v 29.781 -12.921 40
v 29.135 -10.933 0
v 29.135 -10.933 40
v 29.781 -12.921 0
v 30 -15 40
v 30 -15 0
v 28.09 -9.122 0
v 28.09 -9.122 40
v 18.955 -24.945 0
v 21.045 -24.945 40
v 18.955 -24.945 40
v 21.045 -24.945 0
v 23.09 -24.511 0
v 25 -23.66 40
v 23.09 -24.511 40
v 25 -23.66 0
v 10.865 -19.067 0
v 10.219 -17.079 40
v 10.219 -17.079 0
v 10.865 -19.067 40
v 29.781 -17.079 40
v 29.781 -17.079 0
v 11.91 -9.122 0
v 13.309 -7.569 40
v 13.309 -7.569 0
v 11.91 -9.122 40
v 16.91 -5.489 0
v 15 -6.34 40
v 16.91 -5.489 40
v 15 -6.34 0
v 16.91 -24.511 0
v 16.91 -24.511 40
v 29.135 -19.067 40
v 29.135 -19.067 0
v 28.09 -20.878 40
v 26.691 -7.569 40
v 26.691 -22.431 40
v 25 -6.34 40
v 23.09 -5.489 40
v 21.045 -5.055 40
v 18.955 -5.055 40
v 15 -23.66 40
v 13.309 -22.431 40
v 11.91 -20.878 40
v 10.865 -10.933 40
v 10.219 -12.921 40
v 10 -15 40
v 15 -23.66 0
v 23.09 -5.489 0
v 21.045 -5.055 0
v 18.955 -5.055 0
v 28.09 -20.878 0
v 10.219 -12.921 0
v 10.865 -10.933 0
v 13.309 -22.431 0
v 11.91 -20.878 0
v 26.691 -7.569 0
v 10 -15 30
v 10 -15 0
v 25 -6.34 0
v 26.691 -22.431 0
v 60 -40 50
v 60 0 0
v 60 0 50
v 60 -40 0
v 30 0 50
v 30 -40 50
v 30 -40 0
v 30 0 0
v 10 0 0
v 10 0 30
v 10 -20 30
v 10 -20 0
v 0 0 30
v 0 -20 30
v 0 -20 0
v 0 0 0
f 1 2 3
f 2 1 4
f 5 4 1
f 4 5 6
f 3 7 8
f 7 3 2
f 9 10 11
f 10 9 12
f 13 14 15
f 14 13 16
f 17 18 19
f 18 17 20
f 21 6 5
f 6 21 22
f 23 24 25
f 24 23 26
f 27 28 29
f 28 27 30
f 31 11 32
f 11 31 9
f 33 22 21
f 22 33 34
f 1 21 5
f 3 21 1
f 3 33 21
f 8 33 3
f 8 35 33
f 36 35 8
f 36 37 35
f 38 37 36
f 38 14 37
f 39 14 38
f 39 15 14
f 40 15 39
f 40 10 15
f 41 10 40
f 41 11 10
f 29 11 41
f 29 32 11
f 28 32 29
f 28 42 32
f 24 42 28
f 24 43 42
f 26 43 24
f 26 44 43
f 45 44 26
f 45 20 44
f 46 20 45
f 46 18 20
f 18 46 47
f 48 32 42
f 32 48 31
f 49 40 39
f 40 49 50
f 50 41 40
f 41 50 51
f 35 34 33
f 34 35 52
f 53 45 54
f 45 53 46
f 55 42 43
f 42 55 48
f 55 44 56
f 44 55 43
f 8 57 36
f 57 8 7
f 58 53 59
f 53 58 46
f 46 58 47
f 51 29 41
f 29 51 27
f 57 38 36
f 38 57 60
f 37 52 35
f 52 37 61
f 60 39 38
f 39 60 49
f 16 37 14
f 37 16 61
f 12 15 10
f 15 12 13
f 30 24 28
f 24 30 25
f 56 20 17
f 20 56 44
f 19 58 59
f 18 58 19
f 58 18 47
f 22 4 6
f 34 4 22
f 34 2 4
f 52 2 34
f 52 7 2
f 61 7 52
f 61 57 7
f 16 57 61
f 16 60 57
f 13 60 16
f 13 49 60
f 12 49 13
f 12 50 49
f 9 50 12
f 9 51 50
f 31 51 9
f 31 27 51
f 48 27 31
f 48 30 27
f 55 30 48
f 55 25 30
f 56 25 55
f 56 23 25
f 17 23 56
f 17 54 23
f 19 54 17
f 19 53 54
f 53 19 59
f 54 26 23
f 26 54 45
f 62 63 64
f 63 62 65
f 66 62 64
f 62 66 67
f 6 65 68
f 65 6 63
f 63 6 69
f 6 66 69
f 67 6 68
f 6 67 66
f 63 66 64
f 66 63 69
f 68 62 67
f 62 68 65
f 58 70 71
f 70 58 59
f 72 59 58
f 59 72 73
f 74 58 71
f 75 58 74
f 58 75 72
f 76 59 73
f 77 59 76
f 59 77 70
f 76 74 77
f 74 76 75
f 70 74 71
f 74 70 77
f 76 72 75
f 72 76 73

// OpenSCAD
dimensions = [  [10, 20, 30],
  [20, 30, 40],
  [30, 40, 50]
];
type=[0,1,0];

module create_objects(i, prev_width) {
  if (i < len(dimensions)) {
    object_dimensions = dimensions[i];
    translate([prev_width, 0, 0]) {
        if(type[i]==0)
            translate([0,-object_dimensions[1]])cube(object_dimensions);
        else
            translate([object_dimensions[0]/2,-object_dimensions[1]/2,0])cylinder(h=object_dimensions[2],d=object_dimensions[0]);
    }

    create_objects(i+1, prev_width + object_dimensions[0]); // recursive call
  }
}

create_objects(0, 0); // start recursive function with initial values
